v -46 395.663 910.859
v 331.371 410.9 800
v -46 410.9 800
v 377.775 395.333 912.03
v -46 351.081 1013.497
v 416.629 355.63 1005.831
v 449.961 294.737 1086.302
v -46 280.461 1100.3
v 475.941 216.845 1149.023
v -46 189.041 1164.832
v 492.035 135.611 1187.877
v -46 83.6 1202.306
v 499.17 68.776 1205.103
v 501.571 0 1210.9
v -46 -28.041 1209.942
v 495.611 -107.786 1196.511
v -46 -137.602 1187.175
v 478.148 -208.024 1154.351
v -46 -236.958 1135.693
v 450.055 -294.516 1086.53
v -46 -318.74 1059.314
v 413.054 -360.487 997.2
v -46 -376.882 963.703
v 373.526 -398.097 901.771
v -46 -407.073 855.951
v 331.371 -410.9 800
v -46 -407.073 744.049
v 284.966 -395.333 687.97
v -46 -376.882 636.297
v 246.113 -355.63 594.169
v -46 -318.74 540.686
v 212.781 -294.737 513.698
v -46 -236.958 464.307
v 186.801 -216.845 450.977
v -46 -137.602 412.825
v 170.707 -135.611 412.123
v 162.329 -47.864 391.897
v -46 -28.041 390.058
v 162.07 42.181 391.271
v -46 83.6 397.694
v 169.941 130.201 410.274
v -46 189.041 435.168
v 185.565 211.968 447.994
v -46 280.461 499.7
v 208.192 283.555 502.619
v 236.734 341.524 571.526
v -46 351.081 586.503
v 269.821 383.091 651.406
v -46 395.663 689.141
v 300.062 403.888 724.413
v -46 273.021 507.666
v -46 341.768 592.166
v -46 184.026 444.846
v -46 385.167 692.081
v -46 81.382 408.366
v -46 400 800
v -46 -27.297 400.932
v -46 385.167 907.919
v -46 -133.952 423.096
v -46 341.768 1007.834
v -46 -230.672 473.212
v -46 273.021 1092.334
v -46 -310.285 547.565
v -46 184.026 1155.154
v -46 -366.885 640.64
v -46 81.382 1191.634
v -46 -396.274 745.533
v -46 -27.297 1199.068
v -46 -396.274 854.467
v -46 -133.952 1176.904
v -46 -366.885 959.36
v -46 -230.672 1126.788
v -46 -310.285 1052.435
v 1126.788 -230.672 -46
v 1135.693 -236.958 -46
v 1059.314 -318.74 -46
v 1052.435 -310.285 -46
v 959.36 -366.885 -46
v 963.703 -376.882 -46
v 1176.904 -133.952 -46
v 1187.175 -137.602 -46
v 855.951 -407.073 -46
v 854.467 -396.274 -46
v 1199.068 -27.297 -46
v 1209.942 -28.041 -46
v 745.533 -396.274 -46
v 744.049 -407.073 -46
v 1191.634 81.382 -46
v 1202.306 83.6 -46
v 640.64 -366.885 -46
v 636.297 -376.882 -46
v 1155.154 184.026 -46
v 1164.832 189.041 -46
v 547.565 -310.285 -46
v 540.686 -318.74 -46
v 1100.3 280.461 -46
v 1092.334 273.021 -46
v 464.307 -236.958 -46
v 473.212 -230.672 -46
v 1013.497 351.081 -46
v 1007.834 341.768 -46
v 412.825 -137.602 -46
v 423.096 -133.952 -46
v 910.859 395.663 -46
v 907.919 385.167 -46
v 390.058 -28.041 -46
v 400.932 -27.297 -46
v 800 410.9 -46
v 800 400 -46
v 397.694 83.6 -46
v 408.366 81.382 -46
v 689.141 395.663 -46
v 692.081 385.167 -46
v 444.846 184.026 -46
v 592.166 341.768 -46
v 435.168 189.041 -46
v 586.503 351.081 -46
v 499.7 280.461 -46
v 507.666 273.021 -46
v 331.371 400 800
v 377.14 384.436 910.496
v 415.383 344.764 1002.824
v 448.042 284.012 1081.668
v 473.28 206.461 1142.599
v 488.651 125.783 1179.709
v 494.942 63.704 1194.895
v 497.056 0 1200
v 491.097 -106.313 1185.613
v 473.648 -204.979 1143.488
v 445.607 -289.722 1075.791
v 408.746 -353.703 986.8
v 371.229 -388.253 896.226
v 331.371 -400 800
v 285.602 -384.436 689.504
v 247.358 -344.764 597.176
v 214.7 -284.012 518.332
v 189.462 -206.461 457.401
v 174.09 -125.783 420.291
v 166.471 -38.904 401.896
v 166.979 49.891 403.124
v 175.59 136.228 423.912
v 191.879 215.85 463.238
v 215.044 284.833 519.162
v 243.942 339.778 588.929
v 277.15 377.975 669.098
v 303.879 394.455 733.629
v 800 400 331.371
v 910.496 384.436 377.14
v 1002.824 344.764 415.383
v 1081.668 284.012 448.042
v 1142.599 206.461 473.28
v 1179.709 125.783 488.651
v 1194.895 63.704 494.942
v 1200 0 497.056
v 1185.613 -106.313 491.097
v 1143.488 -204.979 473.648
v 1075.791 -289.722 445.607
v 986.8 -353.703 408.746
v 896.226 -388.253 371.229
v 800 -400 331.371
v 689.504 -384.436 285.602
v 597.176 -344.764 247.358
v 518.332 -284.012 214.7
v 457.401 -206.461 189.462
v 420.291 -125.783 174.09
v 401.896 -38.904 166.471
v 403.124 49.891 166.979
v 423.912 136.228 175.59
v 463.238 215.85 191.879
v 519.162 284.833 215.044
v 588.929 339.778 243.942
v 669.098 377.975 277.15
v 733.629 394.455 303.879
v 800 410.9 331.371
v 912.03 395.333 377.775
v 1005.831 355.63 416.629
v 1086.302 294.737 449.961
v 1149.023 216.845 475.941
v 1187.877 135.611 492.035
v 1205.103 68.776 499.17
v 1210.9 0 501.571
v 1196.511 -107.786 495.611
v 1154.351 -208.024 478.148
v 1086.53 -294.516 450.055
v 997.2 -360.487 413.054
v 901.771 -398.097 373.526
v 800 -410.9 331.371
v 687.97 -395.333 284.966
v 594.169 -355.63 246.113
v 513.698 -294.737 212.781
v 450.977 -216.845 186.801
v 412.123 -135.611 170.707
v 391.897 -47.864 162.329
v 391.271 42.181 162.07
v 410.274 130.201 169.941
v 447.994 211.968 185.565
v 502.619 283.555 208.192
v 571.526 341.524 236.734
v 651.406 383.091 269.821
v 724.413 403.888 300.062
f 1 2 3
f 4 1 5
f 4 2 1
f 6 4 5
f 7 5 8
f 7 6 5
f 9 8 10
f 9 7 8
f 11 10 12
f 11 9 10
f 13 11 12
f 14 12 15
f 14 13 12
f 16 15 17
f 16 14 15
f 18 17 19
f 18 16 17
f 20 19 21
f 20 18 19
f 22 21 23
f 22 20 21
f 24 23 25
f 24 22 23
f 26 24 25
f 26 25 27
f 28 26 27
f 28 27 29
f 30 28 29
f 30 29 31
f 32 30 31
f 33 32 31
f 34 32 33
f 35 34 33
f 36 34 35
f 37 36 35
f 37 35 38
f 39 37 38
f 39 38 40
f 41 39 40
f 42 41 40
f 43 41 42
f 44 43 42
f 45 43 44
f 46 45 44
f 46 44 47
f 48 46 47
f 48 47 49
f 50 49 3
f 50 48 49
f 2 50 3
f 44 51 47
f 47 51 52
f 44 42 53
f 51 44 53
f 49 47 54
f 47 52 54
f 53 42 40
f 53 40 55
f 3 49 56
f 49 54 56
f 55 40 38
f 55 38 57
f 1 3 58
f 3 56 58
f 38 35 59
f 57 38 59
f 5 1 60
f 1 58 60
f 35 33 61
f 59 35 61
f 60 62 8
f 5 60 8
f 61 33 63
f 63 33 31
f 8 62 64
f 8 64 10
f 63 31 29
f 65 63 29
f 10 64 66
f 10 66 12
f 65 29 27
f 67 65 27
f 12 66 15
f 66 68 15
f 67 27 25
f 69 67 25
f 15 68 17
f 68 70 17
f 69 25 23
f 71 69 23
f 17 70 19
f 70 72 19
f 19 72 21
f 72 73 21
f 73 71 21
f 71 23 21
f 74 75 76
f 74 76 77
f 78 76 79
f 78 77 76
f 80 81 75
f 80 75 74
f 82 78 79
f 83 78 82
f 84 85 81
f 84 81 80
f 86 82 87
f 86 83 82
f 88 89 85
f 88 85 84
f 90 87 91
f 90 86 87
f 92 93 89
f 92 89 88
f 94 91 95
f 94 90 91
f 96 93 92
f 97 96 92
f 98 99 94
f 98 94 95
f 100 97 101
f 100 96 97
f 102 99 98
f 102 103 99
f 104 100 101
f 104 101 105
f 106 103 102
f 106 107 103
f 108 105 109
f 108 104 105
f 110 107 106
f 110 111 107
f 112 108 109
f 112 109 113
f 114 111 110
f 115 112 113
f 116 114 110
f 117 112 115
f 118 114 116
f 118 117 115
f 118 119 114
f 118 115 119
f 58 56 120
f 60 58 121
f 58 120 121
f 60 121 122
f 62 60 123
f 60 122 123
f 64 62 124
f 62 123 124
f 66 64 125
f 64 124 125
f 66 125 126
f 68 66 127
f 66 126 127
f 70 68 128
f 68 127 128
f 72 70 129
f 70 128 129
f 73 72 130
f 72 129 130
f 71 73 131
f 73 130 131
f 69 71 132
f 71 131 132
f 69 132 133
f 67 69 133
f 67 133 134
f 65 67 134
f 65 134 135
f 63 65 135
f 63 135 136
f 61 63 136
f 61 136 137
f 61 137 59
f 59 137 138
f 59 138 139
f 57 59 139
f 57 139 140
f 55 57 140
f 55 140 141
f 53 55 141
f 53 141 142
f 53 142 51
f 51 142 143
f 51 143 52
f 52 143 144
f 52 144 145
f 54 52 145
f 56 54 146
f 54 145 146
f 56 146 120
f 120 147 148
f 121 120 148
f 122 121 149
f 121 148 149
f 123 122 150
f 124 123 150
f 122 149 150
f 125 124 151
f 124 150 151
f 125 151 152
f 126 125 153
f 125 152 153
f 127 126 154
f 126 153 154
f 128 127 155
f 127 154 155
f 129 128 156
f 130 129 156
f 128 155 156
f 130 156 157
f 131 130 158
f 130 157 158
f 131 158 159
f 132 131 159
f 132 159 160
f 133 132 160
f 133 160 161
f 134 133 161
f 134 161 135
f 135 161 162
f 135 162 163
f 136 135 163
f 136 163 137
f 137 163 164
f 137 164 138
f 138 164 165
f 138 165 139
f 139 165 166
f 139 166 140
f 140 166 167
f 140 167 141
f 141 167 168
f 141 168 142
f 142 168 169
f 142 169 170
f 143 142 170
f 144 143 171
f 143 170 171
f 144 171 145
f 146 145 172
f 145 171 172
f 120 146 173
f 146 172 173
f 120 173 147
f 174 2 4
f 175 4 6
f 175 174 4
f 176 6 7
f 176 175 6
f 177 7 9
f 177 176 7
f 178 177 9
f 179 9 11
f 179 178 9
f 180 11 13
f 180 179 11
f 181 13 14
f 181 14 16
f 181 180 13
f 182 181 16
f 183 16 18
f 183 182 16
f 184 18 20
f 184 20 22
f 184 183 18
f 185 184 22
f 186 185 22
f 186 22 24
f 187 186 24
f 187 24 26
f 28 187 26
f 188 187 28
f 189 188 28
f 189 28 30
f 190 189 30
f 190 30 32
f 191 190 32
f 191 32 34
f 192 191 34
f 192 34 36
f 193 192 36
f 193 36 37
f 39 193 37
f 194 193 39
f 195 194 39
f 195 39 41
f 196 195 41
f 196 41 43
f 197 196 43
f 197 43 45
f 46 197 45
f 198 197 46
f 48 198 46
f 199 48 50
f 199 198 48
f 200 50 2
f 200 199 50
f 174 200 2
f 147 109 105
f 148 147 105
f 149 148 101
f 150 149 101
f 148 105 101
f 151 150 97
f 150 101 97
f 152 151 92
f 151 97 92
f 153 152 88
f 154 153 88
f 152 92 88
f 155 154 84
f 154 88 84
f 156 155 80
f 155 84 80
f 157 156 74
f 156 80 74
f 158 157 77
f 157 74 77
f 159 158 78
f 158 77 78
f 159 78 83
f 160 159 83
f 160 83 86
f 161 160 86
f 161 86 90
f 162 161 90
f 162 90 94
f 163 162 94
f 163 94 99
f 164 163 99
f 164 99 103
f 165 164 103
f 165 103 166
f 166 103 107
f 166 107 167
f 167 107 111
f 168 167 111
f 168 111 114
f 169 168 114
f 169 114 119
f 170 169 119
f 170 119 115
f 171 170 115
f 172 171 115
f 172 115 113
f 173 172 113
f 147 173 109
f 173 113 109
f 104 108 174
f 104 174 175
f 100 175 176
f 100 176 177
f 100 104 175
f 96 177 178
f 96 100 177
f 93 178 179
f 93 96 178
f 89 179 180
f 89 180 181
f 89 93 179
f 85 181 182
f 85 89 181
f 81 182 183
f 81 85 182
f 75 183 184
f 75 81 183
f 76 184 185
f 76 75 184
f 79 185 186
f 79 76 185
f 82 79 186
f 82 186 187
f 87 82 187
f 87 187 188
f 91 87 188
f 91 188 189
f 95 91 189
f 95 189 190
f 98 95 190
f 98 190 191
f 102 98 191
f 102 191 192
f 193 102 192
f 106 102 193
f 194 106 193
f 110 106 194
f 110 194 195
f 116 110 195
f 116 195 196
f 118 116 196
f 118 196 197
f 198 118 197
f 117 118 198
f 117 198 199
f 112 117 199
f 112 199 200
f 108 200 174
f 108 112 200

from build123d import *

# Parameters (mm, degrees)
F2_R   = 410.9
F2_R_2 = 400


with BuildPart() as f3:
    # F3: sweep along a path in F0
    with BuildLine(Plane.XZ) as f3_path:
        Line((-46, 800), (331.3708498985, 800))
        Line((331.3708498985, 800), (800, 331.3708498985))
        Line((800, 331.3708498985), (800, -46))
    # F2 (on line) → F3 (sweep)
    with BuildSketch(Plane.YZ.offset(-46)):
        with Locations((0, 800)):
            Circle(F2_R)
        with Locations((0, 800)):
            Circle(F2_R_2, mode=Mode.SUBTRACT)
    sweep(path=f3_path.line, transition=Transition.RIGHT)


solid = f3.part
